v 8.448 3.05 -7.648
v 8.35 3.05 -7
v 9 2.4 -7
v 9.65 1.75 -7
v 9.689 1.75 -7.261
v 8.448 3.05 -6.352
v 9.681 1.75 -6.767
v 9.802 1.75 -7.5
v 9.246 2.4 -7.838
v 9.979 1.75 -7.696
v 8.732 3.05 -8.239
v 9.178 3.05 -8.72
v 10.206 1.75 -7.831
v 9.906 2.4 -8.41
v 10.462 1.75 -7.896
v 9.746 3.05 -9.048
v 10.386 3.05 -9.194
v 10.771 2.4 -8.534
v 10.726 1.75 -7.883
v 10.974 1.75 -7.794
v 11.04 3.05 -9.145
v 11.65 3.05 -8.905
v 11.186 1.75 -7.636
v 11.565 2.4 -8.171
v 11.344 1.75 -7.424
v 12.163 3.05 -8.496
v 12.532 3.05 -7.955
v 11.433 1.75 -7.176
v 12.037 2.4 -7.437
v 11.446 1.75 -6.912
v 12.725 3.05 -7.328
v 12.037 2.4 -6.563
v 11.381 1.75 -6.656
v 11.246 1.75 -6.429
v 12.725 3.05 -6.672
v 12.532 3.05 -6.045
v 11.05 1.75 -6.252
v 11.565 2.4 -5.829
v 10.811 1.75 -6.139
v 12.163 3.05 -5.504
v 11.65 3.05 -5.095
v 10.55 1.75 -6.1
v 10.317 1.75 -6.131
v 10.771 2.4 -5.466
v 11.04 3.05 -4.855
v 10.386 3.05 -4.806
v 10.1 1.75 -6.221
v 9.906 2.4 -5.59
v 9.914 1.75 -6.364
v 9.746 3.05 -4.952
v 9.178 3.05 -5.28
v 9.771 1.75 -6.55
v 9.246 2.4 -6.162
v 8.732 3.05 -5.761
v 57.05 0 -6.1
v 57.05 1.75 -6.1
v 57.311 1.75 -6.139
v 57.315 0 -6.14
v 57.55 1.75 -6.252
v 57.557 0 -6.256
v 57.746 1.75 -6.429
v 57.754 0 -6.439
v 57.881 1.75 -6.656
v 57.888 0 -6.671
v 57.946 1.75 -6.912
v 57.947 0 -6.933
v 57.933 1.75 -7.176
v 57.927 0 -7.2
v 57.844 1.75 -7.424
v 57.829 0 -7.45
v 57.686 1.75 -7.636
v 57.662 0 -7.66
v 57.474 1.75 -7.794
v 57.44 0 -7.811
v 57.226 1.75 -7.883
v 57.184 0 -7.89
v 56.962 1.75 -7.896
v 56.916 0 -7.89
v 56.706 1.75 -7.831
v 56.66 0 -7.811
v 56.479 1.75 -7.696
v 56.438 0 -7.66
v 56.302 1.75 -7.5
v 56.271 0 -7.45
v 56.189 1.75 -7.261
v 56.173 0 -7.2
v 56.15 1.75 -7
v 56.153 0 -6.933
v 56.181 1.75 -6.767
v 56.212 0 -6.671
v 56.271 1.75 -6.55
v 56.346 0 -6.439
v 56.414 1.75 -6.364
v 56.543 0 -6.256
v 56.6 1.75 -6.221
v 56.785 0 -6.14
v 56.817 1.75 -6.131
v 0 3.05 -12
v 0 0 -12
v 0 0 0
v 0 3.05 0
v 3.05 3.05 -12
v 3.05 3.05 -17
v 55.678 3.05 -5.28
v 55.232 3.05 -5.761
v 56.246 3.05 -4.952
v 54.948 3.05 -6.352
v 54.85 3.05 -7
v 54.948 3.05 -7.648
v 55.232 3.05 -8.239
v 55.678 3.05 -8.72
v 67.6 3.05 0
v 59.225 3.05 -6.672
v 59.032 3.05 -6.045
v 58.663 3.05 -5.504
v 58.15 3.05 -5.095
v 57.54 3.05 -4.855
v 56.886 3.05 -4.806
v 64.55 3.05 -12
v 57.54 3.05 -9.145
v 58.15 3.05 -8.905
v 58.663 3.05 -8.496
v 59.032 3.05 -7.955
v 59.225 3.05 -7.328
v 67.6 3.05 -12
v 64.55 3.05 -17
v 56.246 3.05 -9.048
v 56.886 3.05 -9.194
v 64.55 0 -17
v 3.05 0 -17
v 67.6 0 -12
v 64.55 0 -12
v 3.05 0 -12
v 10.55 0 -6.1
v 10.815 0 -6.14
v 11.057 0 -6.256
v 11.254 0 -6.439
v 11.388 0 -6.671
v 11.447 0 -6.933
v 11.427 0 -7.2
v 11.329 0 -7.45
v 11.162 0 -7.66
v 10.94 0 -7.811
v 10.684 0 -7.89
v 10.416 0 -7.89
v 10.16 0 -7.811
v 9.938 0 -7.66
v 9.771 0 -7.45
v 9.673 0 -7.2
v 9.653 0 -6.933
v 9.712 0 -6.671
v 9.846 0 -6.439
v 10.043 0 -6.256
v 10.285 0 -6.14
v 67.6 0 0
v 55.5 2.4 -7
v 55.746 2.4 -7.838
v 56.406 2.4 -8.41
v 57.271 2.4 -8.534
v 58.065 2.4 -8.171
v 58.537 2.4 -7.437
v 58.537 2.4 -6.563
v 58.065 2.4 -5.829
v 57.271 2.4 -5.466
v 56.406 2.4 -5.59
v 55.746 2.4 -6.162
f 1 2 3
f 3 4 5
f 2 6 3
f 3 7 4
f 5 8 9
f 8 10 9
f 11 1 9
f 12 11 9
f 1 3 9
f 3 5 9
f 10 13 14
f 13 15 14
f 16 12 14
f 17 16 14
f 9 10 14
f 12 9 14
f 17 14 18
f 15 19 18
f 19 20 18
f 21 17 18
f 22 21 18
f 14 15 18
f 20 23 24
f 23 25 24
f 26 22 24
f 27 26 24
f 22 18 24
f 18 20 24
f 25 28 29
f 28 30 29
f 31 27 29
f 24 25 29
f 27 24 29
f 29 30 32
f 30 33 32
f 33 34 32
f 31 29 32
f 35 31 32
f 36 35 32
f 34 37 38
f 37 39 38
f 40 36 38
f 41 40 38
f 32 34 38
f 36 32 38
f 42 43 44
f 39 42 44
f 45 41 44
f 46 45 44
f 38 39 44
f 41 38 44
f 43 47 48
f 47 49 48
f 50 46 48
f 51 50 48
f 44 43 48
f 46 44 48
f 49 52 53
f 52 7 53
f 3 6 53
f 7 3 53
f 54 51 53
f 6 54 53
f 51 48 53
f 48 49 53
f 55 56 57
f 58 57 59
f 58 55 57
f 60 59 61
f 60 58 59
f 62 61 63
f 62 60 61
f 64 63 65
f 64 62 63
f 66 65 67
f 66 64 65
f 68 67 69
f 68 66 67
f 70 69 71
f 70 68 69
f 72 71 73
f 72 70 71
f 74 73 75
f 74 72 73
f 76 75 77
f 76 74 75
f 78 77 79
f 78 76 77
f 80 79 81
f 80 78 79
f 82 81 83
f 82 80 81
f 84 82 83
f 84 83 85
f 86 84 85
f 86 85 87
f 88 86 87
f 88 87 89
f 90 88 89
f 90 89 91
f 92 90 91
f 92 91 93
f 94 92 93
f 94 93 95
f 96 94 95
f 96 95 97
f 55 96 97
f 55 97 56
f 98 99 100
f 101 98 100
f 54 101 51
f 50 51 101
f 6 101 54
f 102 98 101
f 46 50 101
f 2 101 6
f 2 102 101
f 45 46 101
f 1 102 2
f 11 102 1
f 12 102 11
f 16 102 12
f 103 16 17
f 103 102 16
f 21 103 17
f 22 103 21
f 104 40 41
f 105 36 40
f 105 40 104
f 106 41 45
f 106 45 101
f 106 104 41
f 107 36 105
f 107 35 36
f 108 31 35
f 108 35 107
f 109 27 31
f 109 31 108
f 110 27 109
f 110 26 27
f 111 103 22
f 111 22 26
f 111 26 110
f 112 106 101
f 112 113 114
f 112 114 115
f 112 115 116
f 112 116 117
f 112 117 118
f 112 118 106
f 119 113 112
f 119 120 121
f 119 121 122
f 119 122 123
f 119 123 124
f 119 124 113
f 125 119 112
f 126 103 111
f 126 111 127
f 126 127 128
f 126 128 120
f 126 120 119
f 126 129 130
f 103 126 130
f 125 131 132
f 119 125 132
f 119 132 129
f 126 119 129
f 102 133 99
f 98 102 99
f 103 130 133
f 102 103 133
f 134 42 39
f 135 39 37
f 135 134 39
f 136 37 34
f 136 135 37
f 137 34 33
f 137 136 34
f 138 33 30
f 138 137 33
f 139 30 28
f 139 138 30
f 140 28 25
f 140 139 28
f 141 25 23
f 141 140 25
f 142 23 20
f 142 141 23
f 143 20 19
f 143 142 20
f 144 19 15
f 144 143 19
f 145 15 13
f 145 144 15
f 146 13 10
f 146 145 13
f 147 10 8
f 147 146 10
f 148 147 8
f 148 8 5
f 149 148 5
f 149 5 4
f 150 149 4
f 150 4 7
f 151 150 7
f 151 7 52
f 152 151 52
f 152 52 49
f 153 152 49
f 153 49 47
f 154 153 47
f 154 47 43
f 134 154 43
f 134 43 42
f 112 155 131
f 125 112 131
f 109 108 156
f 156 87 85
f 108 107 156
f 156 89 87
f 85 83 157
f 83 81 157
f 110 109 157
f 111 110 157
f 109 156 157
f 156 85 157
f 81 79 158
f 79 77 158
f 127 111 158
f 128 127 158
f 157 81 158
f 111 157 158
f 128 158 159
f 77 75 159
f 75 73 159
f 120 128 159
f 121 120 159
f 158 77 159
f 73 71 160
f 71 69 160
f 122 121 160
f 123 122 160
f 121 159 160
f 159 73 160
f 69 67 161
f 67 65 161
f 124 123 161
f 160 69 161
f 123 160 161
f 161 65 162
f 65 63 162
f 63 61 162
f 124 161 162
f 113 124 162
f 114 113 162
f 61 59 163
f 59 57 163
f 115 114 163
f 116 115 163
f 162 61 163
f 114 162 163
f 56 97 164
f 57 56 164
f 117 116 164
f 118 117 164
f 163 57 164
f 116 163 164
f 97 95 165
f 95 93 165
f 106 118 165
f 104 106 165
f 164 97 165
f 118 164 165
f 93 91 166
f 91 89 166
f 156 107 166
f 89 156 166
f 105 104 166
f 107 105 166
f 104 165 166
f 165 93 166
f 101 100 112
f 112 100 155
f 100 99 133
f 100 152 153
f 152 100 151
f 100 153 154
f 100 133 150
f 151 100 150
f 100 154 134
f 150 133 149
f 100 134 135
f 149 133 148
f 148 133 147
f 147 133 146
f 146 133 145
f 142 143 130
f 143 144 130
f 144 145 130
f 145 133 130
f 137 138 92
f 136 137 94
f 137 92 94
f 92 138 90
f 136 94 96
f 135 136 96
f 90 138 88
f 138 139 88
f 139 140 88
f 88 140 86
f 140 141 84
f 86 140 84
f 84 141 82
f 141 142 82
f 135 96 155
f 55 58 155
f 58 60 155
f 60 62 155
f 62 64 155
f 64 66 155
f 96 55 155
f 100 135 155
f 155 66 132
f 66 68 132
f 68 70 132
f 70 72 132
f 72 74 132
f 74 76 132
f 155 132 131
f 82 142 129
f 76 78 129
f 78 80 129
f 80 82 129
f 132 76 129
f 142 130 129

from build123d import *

# Parameters (mm, degrees)
SKETCH1_R                                       = 0.9
BOSS_EXTRUDE1_DEPTH                             = 3.05
CSK_FOR_M2_FLAT_HEAD_MACHINE_SCREW1_D           = 1.8
CSK_FOR_M2_FLAT_HEAD_MACHINE_SCREW1_CSINK_D     = 4.4
CSK_FOR_M2_FLAT_HEAD_MACHINE_SCREW1_CSINK_ANGLE = 90
CSK_FOR_M2_FLAT_HEAD_MACHINE_SCREW2_D           = 1.8
CSK_FOR_M2_FLAT_HEAD_MACHINE_SCREW2_CSINK_D     = 4.4
CSK_FOR_M2_FLAT_HEAD_MACHINE_SCREW2_CSINK_ANGLE = 90


with BuildPart() as part:
    # Sketch1 → Boss-Extrude1 (new body)
    with BuildSketch(Plane(origin=(0, 0, 0), x_dir=(1, 0, 0), z_dir=(0, 1, 0))):
        Polygon((3.05, 17), (3.05, 12), (0, 12), (0, 0), (67.6, 0), (67.6, 12), (64.55, 12), (64.55, 17), align=None)
        with Locations(Location((57.05, 7, 0), (0, 0, 270))):
            Circle(SKETCH1_R, mode=Mode.SUBTRACT)
        with Locations(Location((10.55, 7, 0), (0, 0, 270))):
            Circle(SKETCH1_R, mode=Mode.SUBTRACT)
    extrude(amount=BOSS_EXTRUDE1_DEPTH)

    # CSK for M2 Flat Head Machine Screw1 (through all)
    with Locations(Plane(origin=(0, 3.05, 0), x_dir=(1, 0, 0), z_dir=(0, 1, 0))):
        with Locations((10.55, 7)):
            CounterSinkHole(CSK_FOR_M2_FLAT_HEAD_MACHINE_SCREW1_D / 2, CSK_FOR_M2_FLAT_HEAD_MACHINE_SCREW1_CSINK_D / 2, counter_sink_angle=CSK_FOR_M2_FLAT_HEAD_MACHINE_SCREW1_CSINK_ANGLE)

    # CSK for M2 Flat Head Machine Screw2 (through all)
    with Locations(Plane(origin=(0, 3.05, 0), x_dir=(1, 0, 0), z_dir=(0, 1, 0))):
        with Locations((57.05, 7)):
            CounterSinkHole(CSK_FOR_M2_FLAT_HEAD_MACHINE_SCREW2_D / 2, CSK_FOR_M2_FLAT_HEAD_MACHINE_SCREW2_CSINK_D / 2, counter_sink_angle=CSK_FOR_M2_FLAT_HEAD_MACHINE_SCREW2_CSINK_ANGLE)


solid = part.part
